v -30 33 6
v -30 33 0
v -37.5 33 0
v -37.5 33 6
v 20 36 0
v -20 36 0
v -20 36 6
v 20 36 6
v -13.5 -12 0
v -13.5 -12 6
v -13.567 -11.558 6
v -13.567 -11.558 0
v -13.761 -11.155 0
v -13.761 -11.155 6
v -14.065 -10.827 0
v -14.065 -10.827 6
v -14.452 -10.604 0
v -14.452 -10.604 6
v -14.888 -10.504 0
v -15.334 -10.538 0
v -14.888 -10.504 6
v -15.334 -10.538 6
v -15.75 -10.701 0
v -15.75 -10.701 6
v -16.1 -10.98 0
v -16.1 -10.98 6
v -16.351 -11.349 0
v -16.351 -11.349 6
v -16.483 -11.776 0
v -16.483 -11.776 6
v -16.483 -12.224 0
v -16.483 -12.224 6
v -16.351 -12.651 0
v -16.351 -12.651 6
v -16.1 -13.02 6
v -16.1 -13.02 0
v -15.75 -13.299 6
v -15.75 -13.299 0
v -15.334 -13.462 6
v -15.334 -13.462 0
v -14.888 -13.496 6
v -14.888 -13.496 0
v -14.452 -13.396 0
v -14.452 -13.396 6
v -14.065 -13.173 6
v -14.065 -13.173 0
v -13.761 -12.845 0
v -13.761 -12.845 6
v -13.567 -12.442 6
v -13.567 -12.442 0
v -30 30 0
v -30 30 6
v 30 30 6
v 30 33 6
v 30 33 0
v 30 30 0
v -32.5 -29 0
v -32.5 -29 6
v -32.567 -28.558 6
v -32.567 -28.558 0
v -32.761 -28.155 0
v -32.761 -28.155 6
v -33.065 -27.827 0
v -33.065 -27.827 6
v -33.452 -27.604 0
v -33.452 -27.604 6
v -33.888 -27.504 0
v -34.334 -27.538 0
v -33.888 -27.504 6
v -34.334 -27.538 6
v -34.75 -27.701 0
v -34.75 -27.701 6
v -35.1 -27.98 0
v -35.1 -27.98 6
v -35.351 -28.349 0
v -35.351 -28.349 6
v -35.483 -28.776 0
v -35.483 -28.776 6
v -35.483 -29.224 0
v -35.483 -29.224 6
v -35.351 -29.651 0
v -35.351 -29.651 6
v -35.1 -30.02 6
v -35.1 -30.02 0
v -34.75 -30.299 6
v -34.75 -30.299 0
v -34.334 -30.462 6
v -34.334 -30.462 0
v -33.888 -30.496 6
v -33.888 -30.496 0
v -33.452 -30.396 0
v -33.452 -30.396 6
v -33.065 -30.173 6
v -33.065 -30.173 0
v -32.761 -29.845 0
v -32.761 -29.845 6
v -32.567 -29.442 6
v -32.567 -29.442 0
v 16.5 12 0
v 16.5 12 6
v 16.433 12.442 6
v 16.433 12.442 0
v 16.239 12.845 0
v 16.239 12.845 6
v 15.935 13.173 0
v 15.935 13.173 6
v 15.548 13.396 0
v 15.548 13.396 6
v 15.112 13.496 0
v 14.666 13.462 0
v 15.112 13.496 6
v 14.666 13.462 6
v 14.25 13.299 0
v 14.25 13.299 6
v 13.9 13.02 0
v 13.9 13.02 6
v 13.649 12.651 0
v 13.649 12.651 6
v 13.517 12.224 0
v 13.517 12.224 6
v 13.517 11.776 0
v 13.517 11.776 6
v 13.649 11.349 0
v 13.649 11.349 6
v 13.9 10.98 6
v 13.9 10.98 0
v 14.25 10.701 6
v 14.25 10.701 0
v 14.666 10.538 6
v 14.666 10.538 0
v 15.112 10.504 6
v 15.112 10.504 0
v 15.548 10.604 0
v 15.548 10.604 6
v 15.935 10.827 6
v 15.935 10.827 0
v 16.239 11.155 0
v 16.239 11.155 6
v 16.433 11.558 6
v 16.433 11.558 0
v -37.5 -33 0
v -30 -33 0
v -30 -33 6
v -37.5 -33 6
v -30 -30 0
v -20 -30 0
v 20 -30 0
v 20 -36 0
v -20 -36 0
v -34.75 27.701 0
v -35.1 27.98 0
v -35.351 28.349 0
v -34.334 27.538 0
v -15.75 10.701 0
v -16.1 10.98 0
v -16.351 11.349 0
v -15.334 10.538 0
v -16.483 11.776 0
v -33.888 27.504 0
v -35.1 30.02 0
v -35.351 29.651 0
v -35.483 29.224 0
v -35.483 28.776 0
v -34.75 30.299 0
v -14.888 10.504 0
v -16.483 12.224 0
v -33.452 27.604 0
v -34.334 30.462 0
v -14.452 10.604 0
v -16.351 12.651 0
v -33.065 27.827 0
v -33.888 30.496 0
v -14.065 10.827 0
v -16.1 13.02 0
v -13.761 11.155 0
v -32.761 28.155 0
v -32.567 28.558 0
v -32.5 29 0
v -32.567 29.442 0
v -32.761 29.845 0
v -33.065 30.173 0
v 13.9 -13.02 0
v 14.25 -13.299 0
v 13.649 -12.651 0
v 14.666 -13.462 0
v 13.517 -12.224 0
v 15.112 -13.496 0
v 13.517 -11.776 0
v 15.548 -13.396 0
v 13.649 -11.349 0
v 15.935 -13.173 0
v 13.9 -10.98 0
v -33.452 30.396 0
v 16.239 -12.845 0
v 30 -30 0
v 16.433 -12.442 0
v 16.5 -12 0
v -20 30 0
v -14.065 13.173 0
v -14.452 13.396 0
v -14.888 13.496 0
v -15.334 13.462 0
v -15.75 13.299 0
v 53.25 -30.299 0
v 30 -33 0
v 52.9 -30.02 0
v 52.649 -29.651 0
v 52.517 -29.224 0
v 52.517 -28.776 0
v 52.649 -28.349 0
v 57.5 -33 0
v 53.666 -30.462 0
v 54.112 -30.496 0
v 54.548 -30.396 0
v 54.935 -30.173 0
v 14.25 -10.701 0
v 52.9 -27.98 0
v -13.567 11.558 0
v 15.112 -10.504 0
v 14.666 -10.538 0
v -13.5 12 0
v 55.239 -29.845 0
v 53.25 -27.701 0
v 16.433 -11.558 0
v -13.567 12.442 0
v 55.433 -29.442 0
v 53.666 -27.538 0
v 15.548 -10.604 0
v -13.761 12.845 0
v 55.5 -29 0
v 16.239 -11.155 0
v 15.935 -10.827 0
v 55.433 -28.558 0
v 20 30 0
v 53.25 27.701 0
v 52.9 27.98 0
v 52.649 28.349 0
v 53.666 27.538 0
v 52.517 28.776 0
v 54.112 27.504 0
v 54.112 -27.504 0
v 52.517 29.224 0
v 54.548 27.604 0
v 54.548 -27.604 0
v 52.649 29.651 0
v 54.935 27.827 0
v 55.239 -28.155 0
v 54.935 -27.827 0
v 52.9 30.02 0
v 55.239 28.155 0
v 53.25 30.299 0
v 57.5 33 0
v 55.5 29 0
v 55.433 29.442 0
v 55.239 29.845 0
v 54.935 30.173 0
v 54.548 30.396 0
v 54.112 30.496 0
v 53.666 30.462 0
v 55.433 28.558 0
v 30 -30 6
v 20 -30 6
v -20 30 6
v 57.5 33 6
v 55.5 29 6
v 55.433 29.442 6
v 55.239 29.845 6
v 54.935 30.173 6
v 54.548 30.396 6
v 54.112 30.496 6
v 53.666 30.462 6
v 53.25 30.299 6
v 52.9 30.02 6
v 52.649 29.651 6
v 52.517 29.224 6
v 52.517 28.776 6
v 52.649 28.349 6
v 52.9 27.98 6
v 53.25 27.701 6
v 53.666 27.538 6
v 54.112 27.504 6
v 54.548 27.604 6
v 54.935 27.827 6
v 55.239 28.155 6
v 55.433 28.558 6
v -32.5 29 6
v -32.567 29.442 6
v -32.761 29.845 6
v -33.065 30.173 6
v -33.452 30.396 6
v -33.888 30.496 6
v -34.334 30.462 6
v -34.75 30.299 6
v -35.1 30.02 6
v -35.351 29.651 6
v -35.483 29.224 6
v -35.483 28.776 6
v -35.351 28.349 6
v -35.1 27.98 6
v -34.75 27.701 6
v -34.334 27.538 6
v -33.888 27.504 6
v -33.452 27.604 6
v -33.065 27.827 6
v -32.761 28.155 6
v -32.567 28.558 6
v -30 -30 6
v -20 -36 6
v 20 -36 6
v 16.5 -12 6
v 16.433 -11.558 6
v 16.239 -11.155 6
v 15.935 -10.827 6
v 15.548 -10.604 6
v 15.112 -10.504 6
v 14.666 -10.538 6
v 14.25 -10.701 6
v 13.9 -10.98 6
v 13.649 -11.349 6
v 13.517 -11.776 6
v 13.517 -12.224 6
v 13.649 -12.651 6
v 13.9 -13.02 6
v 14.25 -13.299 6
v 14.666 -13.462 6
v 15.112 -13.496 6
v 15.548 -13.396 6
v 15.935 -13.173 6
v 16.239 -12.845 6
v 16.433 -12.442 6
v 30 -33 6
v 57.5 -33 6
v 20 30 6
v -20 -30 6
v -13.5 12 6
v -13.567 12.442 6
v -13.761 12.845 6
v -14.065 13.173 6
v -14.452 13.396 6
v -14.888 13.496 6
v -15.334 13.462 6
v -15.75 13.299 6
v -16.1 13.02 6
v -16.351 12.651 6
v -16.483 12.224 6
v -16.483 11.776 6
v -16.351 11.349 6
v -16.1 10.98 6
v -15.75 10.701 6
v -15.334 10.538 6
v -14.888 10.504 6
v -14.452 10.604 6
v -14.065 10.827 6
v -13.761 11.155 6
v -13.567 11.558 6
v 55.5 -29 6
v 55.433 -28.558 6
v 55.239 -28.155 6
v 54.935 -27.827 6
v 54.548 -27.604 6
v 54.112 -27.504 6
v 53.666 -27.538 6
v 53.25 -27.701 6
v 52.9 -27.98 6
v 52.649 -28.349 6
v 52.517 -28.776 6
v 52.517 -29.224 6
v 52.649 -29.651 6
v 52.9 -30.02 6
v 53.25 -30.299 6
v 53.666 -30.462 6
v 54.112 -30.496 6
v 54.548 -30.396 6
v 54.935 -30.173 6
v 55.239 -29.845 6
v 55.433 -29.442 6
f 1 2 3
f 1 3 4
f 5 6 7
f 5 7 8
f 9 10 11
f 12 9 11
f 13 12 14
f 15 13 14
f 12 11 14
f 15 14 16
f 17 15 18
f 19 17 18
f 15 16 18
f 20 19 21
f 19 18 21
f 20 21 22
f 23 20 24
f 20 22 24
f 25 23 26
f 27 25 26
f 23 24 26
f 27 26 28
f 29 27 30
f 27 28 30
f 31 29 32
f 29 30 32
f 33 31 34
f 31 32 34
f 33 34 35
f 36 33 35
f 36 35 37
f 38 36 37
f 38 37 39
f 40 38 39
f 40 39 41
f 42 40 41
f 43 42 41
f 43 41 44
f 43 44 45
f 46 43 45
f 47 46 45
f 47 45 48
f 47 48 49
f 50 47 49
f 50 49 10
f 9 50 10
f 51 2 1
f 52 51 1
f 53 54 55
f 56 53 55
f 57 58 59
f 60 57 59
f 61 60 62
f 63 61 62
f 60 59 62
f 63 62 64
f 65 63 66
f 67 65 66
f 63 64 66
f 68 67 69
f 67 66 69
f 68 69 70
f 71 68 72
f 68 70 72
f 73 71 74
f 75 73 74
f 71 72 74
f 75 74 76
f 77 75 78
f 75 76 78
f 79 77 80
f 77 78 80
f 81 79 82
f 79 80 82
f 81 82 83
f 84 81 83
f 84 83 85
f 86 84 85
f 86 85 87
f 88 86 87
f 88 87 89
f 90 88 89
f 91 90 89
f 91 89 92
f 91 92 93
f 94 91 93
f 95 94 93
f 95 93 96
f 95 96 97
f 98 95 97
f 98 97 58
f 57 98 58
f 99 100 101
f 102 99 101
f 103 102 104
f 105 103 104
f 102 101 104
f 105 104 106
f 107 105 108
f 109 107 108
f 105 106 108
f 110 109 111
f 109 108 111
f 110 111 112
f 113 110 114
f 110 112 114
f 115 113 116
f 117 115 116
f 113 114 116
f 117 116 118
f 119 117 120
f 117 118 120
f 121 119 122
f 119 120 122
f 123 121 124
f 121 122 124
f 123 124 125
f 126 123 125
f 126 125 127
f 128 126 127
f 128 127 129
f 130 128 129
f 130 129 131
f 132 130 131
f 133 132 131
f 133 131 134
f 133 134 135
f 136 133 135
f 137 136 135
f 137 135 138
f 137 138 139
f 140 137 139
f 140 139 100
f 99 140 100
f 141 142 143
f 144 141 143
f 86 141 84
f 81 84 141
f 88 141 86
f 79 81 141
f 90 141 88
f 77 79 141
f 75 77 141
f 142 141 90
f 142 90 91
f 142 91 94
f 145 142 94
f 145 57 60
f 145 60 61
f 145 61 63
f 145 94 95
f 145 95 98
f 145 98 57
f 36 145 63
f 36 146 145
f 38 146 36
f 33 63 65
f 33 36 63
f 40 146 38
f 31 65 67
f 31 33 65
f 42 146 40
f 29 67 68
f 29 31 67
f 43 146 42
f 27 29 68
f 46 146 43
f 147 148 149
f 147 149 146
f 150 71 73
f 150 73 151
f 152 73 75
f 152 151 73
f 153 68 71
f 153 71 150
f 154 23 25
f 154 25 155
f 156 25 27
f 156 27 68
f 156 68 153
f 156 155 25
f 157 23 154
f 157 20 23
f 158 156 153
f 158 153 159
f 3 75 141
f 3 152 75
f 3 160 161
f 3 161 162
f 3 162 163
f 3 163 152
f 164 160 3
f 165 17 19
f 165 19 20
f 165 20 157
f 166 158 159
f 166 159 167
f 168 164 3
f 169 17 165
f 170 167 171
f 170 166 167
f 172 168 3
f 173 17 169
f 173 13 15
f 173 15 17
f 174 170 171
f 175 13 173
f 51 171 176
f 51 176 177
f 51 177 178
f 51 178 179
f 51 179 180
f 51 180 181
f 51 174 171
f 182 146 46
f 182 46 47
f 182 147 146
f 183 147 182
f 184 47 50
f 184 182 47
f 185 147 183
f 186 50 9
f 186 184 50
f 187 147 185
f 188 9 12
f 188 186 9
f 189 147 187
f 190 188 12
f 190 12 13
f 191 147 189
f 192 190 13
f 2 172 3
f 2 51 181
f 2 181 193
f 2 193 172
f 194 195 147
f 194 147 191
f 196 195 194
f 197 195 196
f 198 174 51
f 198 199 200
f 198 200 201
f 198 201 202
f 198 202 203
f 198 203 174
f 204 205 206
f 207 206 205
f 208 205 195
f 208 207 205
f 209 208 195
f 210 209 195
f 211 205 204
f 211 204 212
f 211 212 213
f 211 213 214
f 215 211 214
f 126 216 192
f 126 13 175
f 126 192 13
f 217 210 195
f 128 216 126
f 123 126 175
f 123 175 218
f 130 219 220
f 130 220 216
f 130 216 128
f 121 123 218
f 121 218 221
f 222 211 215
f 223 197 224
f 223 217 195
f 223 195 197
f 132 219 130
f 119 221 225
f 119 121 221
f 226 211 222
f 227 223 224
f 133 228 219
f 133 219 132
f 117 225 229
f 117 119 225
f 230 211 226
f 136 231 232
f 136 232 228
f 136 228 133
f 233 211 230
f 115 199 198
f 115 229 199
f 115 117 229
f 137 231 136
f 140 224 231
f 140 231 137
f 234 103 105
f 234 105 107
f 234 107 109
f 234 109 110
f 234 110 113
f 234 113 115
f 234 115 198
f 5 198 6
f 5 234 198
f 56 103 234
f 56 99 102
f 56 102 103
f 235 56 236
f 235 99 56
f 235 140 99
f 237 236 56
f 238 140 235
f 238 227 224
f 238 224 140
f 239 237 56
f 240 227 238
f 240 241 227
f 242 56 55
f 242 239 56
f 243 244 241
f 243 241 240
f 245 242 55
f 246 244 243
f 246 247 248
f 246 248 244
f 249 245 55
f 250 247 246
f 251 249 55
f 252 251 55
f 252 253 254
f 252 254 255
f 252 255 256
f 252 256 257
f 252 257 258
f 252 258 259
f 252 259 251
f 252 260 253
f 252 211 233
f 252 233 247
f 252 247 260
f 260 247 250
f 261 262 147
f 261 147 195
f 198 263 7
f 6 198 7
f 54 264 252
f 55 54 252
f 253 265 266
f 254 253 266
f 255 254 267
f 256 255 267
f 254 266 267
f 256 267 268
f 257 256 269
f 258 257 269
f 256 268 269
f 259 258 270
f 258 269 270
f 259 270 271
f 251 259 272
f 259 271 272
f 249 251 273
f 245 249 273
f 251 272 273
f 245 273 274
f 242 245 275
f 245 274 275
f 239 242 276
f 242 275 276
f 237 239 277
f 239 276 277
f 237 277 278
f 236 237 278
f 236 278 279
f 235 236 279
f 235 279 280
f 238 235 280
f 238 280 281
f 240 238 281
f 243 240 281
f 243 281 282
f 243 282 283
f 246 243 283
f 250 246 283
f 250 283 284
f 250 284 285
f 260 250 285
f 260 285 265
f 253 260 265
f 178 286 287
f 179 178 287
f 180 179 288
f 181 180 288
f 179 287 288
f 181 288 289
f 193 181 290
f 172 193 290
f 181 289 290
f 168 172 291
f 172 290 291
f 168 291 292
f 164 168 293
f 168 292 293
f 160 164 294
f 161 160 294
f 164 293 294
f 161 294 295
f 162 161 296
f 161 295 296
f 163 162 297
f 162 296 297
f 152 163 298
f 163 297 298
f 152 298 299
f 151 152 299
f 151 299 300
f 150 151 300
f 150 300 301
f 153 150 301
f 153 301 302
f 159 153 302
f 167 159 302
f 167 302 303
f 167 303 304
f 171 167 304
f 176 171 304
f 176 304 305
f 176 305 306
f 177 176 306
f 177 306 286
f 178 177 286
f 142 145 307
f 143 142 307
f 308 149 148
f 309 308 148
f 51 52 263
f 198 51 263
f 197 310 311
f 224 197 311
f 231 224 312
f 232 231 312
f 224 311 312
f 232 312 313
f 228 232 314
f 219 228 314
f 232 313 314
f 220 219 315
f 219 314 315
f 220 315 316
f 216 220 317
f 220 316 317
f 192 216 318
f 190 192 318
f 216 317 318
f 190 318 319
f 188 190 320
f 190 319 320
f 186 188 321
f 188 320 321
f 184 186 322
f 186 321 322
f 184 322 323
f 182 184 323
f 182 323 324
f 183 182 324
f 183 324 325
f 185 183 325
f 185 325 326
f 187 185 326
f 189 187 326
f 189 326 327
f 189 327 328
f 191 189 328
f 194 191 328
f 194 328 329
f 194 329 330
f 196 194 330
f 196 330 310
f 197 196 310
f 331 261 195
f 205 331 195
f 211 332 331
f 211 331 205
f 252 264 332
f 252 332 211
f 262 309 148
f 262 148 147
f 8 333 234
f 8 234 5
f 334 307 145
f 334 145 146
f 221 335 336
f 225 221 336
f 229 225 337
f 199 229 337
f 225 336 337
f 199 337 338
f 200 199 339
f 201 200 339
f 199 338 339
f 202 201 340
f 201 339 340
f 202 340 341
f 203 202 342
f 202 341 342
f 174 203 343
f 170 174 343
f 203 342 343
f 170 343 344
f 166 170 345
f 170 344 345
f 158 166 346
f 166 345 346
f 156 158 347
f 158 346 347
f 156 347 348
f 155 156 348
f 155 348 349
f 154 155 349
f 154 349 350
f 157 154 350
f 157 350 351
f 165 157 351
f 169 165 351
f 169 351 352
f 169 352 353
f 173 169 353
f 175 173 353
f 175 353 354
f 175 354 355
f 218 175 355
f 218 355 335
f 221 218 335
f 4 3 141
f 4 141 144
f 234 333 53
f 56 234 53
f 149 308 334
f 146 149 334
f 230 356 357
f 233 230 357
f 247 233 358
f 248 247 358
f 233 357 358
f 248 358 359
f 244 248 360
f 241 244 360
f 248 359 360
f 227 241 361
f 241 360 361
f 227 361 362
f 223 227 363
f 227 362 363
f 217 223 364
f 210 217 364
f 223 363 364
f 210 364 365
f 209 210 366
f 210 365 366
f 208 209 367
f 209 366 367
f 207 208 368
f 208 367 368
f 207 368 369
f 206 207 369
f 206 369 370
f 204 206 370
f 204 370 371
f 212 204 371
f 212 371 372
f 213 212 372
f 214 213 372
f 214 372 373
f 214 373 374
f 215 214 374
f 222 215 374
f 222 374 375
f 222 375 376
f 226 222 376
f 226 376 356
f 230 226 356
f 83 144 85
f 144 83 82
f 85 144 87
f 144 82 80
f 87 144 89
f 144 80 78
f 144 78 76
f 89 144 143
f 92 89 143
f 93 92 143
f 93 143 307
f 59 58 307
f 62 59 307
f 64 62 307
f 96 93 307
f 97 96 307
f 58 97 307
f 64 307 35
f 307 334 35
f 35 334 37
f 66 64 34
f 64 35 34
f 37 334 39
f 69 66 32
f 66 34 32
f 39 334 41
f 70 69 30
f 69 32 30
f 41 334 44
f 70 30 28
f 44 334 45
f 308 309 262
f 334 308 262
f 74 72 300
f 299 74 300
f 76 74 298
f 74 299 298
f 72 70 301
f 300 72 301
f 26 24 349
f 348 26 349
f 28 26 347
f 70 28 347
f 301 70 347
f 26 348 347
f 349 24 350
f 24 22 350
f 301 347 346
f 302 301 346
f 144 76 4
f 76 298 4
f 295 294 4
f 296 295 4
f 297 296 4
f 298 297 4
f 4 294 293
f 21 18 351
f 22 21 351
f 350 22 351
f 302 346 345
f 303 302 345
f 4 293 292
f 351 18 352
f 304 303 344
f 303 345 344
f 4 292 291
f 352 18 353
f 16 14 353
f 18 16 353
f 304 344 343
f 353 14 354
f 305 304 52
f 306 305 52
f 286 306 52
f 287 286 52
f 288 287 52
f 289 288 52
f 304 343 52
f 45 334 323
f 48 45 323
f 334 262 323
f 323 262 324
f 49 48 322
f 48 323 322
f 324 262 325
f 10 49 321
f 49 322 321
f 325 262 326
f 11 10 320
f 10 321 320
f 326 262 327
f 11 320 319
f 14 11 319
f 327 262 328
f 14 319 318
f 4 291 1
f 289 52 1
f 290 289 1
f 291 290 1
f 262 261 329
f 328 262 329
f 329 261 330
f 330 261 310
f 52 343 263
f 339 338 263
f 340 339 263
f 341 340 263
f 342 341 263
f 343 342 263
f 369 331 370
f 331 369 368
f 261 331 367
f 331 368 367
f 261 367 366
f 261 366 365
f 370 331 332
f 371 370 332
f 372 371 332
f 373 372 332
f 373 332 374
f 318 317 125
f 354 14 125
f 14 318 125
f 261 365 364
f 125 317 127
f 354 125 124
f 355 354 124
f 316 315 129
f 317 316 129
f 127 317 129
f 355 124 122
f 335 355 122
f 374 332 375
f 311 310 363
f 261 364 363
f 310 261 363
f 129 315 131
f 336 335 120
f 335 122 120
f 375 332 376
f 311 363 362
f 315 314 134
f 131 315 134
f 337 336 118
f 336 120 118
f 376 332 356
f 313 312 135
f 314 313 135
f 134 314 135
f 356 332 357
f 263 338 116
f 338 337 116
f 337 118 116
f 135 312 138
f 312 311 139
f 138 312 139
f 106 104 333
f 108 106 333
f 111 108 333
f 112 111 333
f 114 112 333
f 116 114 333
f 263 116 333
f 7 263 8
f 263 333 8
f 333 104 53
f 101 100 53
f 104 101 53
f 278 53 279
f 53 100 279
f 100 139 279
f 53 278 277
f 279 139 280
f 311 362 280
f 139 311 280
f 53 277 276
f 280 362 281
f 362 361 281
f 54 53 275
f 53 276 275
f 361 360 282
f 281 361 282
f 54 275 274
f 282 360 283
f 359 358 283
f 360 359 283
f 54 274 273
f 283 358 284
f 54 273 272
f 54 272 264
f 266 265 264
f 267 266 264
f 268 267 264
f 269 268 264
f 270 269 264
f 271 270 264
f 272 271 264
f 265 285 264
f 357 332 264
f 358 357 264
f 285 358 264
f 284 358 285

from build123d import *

# Parameters (mm, degrees)
SKETCH1_W               = 60
SKETCH1_H               = 72
BOSS_EXTRUDE1_DEPTH     = 6
SKETCH2_W               = 10
SKETCH2_H               = 6
CUT_EXTRUDE1_DEPTH      = 1
CUT_EXTRUDE1_DEPTH_BACK = 7
SKETCH3_R               = 1.5
CUT_EXTRUDE2_DEPTH      = 1
CUT_EXTRUDE2_DEPTH_BACK = 7
SKETCH6_W               = 6
SKETCH6_H               = 66
BOSS_EXTRUDE2_DEPTH     = 27.5
SKETCH7_W               = 6
SKETCH7_H               = 66
BOSS_EXTRUDE3_DEPTH     = 7.5
SKETCH8_R               = 1.5
CUT_EXTRUDE3_DEPTH      = 7


with BuildPart() as part:
    # Sketch1 → Boss-Extrude1 (new body)
    with BuildSketch(Plane.XY):
        Rectangle(SKETCH1_W, SKETCH1_H)
    extrude(amount=BOSS_EXTRUDE1_DEPTH)

    # Sketch2 → Cut-Extrude1 (cut, two sides)
    with BuildSketch(Plane.XY.offset(6)) as cut_extrude1_sk:
        with Locations((-25, 33)):
            Rectangle(SKETCH2_W, SKETCH2_H)
        with Locations((-25, -33)):
            Rectangle(SKETCH2_W, SKETCH2_H)
        with Locations((25, -33)):
            Rectangle(SKETCH2_W, SKETCH2_H)
        with Locations((25, 33)):
            Rectangle(SKETCH2_W, SKETCH2_H)
    extrude(amount=CUT_EXTRUDE1_DEPTH, mode=Mode.SUBTRACT)
    extrude(cut_extrude1_sk.sketch, amount=-CUT_EXTRUDE1_DEPTH_BACK, mode=Mode.SUBTRACT)

    # Sketch3 → Cut-Extrude2 (cut, two sides)
    with BuildSketch(Plane.XY.offset(6)) as cut_extrude2_sk:
        with Locations((-15, 12)):
            Circle(SKETCH3_R)
        with Locations((-15, -12)):
            Circle(SKETCH3_R)
        with Locations((15, -12)):
            Circle(SKETCH3_R)
        with Locations((15, 12)):
            Circle(SKETCH3_R)
    extrude(amount=CUT_EXTRUDE2_DEPTH, mode=Mode.SUBTRACT)
    extrude(cut_extrude2_sk.sketch, amount=-CUT_EXTRUDE2_DEPTH_BACK, mode=Mode.SUBTRACT)

    # Sketch6 → Boss-Extrude2 (add)
    with BuildSketch(Plane(origin=(30, 0, 0), x_dir=(0, 0, -1), z_dir=(1, 0, 0))):
        with Locations((-3, 0)):
            Rectangle(SKETCH6_W, SKETCH6_H)
    extrude(amount=BOSS_EXTRUDE2_DEPTH)

    # Sketch7 → Boss-Extrude3 (add)
    with BuildSketch(Plane.ZY.offset(30)):
        with Locations((3, 0)):
            Rectangle(SKETCH7_W, SKETCH7_H)
    extrude(amount=BOSS_EXTRUDE3_DEPTH)

    # Sketch8 → Cut-Extrude3 (cut, through all)
    with BuildSketch(Plane.XY.offset(6)):
        with Locations((54, -29)):
            Circle(SKETCH8_R)
        with Locations((54, 29)):
            Circle(SKETCH8_R)
        with Locations((-34, 29)):
            Circle(SKETCH8_R)
        with Locations((-34, -29)):
            Circle(SKETCH8_R)
    extrude(amount=-CUT_EXTRUDE3_DEPTH, mode=Mode.SUBTRACT)


solid = part.part
